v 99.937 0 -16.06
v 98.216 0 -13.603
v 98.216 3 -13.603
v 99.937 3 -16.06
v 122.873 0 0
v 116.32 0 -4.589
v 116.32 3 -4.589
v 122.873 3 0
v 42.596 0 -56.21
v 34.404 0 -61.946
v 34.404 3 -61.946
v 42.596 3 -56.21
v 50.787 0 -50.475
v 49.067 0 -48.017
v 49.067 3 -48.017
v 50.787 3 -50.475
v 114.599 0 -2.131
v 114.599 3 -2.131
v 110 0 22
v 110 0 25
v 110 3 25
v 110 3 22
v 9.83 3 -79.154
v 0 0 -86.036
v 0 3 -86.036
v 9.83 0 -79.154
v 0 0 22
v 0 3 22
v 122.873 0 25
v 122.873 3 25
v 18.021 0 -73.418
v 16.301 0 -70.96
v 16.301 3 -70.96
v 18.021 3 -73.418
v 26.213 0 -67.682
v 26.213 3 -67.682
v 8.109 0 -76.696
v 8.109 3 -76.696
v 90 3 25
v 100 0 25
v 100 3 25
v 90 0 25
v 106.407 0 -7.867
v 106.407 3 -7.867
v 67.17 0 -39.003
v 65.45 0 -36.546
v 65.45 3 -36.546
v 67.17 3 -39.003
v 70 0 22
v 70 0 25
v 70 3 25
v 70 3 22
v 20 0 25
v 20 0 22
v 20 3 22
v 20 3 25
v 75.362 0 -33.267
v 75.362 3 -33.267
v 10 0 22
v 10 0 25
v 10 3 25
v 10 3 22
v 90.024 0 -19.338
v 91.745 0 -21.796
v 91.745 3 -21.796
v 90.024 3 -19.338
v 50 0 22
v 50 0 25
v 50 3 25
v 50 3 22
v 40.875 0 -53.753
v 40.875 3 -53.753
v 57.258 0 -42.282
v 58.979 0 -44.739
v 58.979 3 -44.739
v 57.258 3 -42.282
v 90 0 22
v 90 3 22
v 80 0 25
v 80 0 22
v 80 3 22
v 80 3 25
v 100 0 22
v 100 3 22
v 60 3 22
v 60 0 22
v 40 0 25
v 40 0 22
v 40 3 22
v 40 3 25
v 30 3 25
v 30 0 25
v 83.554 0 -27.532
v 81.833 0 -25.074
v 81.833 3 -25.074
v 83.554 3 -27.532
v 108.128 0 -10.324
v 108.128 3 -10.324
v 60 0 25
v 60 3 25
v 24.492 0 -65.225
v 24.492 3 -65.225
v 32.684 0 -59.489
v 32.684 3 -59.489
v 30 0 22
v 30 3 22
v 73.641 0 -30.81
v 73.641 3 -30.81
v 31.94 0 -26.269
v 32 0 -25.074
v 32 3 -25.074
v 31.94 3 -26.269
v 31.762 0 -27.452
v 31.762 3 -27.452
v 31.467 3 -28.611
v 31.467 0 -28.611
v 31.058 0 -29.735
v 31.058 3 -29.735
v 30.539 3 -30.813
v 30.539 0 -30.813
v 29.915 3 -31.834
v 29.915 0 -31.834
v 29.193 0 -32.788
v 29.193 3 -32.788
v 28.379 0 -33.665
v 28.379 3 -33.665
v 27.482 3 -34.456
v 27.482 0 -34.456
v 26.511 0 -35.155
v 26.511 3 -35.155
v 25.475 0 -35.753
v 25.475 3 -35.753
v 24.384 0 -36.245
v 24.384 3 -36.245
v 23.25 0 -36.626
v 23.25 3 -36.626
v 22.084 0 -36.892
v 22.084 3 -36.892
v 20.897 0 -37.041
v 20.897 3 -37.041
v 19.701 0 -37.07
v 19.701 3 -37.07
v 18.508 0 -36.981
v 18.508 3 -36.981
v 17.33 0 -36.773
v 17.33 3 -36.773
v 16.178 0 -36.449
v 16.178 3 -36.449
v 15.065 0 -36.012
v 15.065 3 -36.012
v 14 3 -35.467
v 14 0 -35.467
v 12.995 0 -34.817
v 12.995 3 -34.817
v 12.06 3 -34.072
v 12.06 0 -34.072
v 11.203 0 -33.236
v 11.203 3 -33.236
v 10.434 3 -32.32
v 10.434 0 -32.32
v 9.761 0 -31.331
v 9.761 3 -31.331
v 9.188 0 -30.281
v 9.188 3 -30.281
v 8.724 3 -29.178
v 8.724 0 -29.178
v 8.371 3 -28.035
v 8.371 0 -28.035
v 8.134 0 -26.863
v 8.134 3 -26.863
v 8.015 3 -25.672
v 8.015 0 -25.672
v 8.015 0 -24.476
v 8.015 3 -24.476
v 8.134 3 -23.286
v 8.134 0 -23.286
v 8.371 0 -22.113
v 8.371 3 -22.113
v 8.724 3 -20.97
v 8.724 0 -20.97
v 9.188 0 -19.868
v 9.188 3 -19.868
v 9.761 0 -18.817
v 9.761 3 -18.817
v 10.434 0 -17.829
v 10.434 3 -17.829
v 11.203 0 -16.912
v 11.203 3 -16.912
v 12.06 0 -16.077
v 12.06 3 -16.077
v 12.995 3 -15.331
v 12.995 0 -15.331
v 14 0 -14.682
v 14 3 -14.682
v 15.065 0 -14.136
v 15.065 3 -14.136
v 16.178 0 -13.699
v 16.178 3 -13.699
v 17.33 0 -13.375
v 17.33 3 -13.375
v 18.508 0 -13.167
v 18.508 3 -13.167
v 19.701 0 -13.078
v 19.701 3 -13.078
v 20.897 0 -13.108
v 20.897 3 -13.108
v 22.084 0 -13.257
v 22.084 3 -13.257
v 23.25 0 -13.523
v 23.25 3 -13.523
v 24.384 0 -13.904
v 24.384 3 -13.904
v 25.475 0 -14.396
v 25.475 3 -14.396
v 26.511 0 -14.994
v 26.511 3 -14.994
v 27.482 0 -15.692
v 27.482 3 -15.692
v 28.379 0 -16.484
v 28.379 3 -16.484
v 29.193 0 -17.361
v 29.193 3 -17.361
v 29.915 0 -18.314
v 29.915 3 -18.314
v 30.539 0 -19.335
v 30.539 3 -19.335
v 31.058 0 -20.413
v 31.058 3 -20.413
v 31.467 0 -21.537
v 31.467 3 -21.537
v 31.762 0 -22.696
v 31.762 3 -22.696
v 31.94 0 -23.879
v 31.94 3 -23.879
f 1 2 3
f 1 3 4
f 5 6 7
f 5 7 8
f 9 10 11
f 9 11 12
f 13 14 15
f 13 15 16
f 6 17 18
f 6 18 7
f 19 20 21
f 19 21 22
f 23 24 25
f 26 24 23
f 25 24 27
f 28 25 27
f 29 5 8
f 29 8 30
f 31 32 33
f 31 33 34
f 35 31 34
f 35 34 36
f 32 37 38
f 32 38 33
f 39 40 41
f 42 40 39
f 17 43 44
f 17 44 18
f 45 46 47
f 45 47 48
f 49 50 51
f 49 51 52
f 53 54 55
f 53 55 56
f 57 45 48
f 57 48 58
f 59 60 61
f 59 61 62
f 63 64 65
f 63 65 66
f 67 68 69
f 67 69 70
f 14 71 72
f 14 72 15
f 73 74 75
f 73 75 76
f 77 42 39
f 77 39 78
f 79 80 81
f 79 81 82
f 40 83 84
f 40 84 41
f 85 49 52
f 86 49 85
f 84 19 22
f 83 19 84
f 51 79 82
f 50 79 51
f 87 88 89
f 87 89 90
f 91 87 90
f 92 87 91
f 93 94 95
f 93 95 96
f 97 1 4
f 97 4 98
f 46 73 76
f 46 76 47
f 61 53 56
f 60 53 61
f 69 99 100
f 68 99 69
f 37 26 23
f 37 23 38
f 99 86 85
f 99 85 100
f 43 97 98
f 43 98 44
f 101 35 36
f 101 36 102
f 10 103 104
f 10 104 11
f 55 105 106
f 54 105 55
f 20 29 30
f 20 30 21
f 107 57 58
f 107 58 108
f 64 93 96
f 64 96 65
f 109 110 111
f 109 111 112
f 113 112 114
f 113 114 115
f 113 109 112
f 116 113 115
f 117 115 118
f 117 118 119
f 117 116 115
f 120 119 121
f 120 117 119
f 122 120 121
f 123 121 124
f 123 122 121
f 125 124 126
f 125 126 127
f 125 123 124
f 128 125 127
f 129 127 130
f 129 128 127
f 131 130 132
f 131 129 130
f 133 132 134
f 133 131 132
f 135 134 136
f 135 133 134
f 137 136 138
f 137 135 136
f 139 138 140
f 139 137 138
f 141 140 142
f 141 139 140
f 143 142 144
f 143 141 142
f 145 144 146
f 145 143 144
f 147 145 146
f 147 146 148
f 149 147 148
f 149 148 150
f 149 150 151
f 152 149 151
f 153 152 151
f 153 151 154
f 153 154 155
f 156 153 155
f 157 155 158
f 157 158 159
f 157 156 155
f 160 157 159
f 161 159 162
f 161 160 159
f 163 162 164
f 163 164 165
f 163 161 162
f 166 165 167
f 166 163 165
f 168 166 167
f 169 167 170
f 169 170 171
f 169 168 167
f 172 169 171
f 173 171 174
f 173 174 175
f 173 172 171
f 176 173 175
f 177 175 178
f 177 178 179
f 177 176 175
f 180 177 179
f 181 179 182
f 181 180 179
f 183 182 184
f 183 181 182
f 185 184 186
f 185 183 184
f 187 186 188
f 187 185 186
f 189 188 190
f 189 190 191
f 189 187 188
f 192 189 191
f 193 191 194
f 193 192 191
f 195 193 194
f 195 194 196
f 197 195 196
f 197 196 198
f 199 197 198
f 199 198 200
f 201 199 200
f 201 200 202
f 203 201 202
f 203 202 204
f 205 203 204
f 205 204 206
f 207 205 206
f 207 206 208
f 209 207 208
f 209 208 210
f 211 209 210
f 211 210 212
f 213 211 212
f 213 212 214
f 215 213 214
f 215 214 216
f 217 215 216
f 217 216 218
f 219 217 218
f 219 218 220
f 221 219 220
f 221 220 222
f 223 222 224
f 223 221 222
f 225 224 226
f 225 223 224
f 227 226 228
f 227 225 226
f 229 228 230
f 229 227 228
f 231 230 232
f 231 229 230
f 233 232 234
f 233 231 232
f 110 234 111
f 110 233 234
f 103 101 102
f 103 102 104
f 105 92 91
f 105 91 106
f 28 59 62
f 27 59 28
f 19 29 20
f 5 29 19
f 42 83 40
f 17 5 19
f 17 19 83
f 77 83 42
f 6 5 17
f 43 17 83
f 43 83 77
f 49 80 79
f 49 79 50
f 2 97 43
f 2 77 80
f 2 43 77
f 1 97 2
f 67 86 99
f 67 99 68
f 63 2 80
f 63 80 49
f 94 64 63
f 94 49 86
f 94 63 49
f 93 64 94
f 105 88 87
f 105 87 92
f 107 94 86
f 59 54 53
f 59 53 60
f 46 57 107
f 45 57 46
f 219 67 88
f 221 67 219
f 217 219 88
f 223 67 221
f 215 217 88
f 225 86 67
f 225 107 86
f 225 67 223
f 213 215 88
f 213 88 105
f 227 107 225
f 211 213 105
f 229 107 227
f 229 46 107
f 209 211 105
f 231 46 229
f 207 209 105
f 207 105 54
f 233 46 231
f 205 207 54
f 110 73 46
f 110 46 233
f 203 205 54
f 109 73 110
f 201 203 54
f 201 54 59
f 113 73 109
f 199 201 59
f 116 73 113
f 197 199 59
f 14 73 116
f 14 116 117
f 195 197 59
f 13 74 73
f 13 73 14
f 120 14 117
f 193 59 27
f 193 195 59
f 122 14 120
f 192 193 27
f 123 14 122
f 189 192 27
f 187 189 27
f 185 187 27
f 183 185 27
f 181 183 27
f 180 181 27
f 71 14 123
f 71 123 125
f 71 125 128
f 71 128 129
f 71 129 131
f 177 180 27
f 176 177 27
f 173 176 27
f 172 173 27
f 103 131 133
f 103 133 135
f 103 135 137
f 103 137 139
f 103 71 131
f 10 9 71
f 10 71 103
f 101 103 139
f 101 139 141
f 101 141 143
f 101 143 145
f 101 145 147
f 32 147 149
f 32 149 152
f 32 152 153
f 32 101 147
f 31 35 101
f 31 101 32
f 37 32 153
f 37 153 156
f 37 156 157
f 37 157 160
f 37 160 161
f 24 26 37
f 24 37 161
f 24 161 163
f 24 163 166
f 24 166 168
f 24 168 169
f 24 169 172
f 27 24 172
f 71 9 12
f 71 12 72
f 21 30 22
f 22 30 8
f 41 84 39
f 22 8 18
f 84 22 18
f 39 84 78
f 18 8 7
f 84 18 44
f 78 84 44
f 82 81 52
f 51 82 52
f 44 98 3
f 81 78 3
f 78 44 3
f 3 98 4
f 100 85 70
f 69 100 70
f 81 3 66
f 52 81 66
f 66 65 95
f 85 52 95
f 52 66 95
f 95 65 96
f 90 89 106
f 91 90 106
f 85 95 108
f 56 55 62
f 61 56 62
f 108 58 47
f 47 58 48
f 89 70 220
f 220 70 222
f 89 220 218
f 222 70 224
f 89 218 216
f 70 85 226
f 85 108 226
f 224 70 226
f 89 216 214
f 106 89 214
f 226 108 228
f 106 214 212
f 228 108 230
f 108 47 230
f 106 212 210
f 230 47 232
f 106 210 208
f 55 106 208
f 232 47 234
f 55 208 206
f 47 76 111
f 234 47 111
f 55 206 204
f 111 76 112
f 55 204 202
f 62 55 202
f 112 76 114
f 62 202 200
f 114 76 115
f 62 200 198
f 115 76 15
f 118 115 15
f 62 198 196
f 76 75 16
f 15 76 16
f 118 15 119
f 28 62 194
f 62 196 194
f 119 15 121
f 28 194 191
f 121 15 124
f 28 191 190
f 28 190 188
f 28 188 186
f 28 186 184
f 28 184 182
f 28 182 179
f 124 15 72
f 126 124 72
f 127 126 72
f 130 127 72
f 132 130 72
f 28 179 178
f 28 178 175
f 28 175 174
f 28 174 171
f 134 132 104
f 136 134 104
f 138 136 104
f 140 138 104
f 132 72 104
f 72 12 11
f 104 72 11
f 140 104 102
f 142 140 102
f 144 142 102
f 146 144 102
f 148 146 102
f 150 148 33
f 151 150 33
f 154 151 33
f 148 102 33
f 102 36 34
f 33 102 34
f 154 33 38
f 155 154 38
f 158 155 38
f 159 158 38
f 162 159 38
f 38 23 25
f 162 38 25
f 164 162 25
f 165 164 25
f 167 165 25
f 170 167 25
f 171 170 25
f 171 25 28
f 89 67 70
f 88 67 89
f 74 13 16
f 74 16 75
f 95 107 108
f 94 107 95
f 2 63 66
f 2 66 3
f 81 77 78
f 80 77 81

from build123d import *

# Parameters (mm, degrees)
ESQUISSE1_R        = 12
BOSS_EXTRU_1_DEPTH = 3


with BuildPart() as part:
    # Esquisse1 → Boss.-Extru.1 (new body)
    with BuildSketch(Plane(origin=(0, 0, 0), x_dir=(1, 0, 0), z_dir=(0, 1, 0))):
        Polygon((0, 0), (0, 86.036465453), (9.829824531, 79.153548216), (8.109095222, 76.696092084), (16.300615665, 70.96032772), (18.021344974, 73.417783853), (26.212865417, 67.682019489), (24.492136108, 65.224563357), (32.683656551, 59.488798993), (34.40438586, 61.946255126), (42.595906303, 56.210490762), (40.875176994, 53.75303463), (49.066697437, 48.017270266), (50.787426746, 50.474726399), (58.978947189, 44.738962035), (57.25821788, 42.281505903), (65.449738323, 36.545741539), (67.170467632, 39.003197672), (75.361988075, 33.267433308), (73.641258766, 30.809977175), (81.832779208, 25.074212812), (83.553508517, 27.531668945), (91.74502896, 21.795904581), (90.024299651, 19.338448448), (98.215820094, 13.602684085), (99.936549403, 16.060140218), (108.128069846, 10.324375854), (106.407340537, 7.866919721), (114.59886098, 2.131155358), (116.319590289, 4.588611491), (122.872806643, 0), (122.872806643, -25), (110, -25), (110, -22), (100, -22), (100, -25), (90, -25), (90, -22), (80, -22), (80, -25), (70, -25), (70, -22), (60, -22), (60, -25), (50, -25), (50, -22), (40, -22), (40, -25), (30, -25), (30, -22), (20, -22), (20, -25), (10, -25), (10, -22), (0, -22), align=None)
        with Locations((20, 25.074212812)):
            Circle(ESQUISSE1_R, mode=Mode.SUBTRACT)
    extrude(amount=BOSS_EXTRU_1_DEPTH)


solid = part.part
